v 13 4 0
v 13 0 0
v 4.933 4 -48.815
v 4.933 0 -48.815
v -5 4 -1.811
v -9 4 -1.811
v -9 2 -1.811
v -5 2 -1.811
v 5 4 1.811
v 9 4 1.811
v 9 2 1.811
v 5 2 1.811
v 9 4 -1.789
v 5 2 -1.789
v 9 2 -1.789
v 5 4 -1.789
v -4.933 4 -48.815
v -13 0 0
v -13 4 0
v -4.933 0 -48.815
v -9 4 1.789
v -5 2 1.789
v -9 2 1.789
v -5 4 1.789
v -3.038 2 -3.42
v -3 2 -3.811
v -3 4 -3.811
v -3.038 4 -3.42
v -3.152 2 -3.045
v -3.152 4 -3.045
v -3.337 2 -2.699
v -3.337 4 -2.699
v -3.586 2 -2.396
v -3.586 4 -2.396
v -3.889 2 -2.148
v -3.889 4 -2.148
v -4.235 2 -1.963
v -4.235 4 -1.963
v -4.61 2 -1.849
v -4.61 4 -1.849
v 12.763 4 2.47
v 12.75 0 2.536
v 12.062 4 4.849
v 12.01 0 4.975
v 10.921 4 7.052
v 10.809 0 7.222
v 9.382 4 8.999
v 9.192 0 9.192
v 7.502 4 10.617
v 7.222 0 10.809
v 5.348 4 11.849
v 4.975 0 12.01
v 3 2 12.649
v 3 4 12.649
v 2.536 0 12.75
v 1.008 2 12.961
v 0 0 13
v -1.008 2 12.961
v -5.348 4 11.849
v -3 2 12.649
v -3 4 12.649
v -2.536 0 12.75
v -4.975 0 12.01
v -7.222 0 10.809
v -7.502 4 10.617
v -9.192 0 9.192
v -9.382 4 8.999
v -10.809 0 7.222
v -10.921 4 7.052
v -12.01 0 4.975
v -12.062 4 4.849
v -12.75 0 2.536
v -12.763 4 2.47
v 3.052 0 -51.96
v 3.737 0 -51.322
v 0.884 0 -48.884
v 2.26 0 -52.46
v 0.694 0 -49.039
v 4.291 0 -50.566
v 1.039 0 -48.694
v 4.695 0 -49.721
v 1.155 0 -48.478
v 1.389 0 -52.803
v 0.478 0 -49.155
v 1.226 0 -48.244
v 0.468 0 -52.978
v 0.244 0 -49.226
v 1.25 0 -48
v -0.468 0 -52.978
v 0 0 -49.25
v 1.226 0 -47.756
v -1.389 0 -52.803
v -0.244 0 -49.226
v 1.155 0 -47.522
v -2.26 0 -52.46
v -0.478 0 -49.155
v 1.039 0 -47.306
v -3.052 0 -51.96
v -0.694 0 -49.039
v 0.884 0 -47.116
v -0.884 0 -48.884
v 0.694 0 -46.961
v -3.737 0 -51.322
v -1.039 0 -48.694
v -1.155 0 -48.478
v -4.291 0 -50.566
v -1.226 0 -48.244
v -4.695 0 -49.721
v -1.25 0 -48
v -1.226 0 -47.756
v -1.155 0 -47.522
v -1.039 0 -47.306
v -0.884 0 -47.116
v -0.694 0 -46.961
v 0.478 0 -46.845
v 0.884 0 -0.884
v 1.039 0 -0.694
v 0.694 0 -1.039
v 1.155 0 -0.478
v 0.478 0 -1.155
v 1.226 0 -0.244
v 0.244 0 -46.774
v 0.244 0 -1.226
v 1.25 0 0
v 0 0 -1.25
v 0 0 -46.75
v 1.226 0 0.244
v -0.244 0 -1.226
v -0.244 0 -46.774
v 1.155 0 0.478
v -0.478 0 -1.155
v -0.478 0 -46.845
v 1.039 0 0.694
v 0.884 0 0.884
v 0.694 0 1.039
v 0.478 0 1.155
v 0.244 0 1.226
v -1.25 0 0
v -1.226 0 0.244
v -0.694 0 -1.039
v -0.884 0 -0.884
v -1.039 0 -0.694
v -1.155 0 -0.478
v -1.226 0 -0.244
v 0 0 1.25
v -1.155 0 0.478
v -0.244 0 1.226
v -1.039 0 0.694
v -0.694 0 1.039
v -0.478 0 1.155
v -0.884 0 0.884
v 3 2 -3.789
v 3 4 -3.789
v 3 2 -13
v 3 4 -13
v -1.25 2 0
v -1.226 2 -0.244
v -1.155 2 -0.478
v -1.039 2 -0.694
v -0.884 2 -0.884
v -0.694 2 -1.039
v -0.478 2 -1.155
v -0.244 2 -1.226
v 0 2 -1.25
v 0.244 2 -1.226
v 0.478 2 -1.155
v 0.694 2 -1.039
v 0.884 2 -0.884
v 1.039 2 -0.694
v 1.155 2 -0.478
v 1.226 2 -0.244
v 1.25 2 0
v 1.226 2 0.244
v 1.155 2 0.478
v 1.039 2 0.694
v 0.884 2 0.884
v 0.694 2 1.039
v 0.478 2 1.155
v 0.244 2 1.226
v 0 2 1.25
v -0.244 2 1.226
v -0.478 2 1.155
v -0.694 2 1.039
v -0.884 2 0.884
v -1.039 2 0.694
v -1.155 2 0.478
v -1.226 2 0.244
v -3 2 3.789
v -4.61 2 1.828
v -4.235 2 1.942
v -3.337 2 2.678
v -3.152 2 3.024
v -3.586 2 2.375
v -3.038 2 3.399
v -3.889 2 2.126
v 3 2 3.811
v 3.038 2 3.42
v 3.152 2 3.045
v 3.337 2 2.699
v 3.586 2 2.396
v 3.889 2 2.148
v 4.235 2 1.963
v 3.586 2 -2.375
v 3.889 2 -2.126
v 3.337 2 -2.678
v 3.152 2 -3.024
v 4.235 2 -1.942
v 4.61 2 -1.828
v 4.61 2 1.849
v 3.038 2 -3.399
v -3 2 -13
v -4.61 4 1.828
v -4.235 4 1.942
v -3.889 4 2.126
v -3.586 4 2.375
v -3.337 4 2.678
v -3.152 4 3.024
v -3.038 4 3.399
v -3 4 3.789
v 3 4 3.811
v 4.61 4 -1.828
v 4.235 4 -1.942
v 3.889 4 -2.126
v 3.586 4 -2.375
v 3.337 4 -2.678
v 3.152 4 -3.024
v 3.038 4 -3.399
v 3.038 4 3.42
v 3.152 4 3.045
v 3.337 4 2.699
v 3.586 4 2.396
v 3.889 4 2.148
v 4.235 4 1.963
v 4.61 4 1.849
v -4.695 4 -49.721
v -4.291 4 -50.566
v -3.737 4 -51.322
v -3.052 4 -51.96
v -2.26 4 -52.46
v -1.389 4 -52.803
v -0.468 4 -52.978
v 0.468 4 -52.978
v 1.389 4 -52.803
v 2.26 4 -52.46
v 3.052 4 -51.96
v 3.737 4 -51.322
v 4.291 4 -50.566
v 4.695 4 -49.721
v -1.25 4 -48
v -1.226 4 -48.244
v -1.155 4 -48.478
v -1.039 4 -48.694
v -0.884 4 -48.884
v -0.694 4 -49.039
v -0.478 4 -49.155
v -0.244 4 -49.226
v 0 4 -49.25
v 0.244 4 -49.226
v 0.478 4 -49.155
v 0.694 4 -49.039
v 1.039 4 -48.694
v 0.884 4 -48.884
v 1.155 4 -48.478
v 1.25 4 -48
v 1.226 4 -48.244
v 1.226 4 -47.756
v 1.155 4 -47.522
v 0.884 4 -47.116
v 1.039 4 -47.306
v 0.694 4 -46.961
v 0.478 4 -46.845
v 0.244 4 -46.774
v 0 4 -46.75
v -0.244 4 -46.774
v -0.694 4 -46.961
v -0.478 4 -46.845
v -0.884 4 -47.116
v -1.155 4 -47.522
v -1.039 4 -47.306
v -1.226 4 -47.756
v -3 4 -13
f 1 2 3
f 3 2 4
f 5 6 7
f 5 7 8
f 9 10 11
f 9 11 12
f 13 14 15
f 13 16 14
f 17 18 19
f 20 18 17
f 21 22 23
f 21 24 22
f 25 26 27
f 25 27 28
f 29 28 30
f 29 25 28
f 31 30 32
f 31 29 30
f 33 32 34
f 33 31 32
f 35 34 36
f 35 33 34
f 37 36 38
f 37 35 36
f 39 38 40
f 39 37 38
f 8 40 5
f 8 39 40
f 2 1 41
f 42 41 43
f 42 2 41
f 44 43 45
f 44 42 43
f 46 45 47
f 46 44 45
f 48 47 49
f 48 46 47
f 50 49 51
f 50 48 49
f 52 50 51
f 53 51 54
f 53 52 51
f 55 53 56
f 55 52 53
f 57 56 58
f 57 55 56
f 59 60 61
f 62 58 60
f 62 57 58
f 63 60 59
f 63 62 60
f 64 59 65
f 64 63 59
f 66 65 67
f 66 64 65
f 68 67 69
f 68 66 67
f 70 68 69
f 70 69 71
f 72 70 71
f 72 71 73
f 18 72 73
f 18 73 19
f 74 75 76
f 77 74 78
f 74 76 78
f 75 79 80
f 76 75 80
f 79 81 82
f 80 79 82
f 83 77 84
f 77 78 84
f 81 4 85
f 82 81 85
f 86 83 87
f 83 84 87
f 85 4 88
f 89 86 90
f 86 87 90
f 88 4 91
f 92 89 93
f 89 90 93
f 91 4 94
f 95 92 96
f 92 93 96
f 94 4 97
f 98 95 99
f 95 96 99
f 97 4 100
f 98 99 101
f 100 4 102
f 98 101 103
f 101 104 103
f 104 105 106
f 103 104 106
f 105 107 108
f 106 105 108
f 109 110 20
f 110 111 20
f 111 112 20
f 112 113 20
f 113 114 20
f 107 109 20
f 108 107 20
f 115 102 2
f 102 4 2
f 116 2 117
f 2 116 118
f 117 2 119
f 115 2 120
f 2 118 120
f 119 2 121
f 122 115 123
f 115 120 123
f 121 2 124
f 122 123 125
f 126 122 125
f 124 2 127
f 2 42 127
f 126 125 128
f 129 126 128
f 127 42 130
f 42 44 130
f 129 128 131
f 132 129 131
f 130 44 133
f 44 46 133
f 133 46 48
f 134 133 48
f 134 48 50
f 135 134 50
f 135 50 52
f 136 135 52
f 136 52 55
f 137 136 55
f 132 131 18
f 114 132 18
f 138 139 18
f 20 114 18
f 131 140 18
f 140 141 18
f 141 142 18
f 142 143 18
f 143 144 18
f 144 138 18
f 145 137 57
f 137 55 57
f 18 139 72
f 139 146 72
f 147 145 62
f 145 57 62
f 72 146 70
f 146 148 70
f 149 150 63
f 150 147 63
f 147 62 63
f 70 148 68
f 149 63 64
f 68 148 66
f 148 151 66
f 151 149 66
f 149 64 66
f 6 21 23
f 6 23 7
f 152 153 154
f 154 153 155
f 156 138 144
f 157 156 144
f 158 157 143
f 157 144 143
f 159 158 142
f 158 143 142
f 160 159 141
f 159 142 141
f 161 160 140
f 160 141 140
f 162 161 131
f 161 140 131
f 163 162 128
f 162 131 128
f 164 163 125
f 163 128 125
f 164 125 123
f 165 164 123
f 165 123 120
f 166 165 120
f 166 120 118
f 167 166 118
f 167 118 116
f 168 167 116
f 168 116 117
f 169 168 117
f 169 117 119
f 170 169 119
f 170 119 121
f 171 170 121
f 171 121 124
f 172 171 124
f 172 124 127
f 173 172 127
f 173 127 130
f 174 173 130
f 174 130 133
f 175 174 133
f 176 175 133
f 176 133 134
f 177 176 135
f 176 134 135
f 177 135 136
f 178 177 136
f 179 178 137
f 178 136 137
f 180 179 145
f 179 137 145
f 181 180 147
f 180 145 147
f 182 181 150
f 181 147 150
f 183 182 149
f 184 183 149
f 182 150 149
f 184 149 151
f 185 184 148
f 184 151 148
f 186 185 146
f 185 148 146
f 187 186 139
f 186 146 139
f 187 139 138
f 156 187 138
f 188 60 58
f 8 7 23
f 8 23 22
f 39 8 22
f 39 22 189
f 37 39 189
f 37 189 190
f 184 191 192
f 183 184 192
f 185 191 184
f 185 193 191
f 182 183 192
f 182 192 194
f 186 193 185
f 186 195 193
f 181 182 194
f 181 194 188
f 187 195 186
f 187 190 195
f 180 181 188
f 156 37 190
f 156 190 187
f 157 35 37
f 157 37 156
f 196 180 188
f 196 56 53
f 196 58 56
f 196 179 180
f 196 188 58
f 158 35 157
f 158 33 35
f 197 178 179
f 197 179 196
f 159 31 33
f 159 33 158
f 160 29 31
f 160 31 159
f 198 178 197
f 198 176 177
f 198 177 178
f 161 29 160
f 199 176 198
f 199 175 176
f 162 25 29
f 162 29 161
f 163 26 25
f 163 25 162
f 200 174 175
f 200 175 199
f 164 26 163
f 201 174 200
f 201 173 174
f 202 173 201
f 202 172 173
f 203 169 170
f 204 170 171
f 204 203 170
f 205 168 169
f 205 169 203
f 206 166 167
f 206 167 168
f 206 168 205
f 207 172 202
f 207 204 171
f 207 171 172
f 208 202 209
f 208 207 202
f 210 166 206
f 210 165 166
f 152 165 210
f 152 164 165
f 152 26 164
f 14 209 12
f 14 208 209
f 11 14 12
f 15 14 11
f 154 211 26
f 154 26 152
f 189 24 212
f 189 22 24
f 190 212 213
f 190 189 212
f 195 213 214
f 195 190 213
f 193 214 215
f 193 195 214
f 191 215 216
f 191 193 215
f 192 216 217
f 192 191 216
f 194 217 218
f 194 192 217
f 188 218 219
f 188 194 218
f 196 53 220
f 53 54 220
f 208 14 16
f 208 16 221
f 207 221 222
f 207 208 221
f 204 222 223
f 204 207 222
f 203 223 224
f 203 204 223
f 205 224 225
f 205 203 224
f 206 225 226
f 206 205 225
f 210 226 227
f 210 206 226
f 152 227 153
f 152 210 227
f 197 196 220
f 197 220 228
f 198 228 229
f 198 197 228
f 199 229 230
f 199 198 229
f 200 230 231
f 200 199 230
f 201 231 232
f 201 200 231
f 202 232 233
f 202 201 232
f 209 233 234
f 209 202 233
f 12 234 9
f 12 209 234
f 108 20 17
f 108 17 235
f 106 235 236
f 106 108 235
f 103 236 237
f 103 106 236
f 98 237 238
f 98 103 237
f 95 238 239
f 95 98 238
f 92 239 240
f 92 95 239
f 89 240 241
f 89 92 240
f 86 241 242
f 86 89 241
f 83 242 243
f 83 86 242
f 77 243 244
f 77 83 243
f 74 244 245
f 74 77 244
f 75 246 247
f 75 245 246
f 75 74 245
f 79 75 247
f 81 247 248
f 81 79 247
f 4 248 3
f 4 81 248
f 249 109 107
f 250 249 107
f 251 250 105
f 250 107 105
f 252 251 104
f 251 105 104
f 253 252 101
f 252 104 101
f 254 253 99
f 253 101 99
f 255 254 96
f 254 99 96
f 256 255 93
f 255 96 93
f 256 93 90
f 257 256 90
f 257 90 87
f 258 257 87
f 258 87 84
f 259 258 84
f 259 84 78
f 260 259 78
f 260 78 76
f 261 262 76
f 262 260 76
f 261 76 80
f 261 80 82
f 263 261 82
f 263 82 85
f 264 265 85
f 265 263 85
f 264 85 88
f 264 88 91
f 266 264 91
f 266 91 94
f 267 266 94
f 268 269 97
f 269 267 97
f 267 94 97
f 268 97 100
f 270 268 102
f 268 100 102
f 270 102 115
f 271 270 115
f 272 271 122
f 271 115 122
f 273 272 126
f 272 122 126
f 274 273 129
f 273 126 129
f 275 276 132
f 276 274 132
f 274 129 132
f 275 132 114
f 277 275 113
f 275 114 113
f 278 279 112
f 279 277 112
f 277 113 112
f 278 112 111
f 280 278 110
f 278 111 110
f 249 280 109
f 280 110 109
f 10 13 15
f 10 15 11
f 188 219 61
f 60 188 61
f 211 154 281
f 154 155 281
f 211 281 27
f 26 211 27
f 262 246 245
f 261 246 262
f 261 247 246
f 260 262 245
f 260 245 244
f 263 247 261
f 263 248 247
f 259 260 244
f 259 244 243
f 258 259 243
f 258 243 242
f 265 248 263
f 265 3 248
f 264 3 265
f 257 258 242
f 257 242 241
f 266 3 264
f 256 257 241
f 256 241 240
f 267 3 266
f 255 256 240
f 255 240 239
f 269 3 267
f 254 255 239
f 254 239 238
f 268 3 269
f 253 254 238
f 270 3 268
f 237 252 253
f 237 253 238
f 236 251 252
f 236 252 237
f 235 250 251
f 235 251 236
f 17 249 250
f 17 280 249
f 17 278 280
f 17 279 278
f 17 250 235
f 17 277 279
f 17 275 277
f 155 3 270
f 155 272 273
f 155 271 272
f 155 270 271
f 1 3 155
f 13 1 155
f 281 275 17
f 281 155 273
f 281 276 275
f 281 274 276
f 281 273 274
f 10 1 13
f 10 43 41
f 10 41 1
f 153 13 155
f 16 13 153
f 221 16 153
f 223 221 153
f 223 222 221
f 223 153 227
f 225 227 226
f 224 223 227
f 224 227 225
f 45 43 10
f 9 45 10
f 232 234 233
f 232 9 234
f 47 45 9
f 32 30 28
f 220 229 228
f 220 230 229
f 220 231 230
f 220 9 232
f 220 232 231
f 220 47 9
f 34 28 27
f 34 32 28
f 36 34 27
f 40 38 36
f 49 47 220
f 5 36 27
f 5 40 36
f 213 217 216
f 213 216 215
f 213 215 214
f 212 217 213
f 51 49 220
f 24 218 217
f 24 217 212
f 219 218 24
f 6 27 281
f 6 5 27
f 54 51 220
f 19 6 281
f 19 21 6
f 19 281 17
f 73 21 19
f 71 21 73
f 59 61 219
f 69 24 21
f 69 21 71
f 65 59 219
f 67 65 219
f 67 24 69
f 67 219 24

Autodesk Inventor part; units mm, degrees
ref_plane "YZ Plane" through (0, 0, 0) normal (1, 0, 0) x (0, 1, 0)
ref_plane "XZ Plane" through (0, 0, 0) normal (0, 1, 0) x (-1, 0, 0)
ref_plane "XY Plane" through (0, 0, 0) normal (0, 0, 1) x (1, 0, 0)
sketch "Sketch1" plane through (0, 0, 0) normal (0, 1, 0) x (-1, 0, 0)
  arc A0 (13, 0) -> (-13, 0) centre (0, 0) ccw
  circle A1 centre (0, 0) radius 1.25
  arc A2 (-4.9331, -48.8152) -> (4.9331, -48.8152) centre (0, -48) ccw
  line L0 (13, 0) -> (4.9331, -48.8152)
  line L1 (-13, 0) -> (-4.9331, -48.8152)
  circle A3 centre (0, -48) radius 1.25
  dimension "d3" = 2.5
  dimension "d16" = 10
  dimension "d17" = 2.5
  dimension "d19" = 13
  dimension "d20" = 48
extrude "Extrusion1" add sketch "Sketch1" along normal blind 4
sketch "Sketch2" plane through (0, 4, 0) normal (0, 1, 0) x (1, 0, 0)
  line L0 (-3, -13) -> (3, -13)
  line L1 (3, 13) -> (-3, 13)
  circle A0 centre (0, 0) radius 1.25 projected
  line L2 (-3, -13) -> (3, 13) construction
  line L3 (3, -13) -> (-3, 13) construction
  line L4 (9, 1.7894) -> (9, -1.8106)
  line L5 (-9, -1.7894) -> (-9, 1.8106)
  line L6 (-9, 1.8106) -> (9, -1.8106) construction
  line L7 (9, 1.7894) -> (-9, -1.7894) construction
  line L8 (3, 1.7894) -> (9, 1.7894)
  line L9 (-9, 1.8106) -> (-3, 1.8106)
  line L10 (-3, -1.7894) -> (-9, -1.7894)
  line L11 (9, -1.8106) -> (3, -1.8106)
  line L12 (3, 1.7894) -> (3, 13)
  line L13 (3, -13) -> (3, -1.8106)
  line L14 (-3, -1.7894) -> (-3, -13)
  line L15 (-3, 13) -> (-3, 1.8106)
  point P0 (-9, 0.0106)
  dimension "d7" = 6
  dimension "d12" = 3.6
  dimension "d13" = 13
  dimension "d14" = 13
  dimension "d15" = 9
extrude "Extrusion2" cut sketch "Sketch2" against normal blind 2 contours L14 L10 L5 L9 L15 L1 L12 L8 L4 L11 L13 L0 | A0
fillet "Fillet3" radius 2 4 edges at (-3, 3, -1.8106) (-3, 3, 1.7894) (3, 3, -1.7894) (3, 3, 1.8106)
properties part number "6P-016"
